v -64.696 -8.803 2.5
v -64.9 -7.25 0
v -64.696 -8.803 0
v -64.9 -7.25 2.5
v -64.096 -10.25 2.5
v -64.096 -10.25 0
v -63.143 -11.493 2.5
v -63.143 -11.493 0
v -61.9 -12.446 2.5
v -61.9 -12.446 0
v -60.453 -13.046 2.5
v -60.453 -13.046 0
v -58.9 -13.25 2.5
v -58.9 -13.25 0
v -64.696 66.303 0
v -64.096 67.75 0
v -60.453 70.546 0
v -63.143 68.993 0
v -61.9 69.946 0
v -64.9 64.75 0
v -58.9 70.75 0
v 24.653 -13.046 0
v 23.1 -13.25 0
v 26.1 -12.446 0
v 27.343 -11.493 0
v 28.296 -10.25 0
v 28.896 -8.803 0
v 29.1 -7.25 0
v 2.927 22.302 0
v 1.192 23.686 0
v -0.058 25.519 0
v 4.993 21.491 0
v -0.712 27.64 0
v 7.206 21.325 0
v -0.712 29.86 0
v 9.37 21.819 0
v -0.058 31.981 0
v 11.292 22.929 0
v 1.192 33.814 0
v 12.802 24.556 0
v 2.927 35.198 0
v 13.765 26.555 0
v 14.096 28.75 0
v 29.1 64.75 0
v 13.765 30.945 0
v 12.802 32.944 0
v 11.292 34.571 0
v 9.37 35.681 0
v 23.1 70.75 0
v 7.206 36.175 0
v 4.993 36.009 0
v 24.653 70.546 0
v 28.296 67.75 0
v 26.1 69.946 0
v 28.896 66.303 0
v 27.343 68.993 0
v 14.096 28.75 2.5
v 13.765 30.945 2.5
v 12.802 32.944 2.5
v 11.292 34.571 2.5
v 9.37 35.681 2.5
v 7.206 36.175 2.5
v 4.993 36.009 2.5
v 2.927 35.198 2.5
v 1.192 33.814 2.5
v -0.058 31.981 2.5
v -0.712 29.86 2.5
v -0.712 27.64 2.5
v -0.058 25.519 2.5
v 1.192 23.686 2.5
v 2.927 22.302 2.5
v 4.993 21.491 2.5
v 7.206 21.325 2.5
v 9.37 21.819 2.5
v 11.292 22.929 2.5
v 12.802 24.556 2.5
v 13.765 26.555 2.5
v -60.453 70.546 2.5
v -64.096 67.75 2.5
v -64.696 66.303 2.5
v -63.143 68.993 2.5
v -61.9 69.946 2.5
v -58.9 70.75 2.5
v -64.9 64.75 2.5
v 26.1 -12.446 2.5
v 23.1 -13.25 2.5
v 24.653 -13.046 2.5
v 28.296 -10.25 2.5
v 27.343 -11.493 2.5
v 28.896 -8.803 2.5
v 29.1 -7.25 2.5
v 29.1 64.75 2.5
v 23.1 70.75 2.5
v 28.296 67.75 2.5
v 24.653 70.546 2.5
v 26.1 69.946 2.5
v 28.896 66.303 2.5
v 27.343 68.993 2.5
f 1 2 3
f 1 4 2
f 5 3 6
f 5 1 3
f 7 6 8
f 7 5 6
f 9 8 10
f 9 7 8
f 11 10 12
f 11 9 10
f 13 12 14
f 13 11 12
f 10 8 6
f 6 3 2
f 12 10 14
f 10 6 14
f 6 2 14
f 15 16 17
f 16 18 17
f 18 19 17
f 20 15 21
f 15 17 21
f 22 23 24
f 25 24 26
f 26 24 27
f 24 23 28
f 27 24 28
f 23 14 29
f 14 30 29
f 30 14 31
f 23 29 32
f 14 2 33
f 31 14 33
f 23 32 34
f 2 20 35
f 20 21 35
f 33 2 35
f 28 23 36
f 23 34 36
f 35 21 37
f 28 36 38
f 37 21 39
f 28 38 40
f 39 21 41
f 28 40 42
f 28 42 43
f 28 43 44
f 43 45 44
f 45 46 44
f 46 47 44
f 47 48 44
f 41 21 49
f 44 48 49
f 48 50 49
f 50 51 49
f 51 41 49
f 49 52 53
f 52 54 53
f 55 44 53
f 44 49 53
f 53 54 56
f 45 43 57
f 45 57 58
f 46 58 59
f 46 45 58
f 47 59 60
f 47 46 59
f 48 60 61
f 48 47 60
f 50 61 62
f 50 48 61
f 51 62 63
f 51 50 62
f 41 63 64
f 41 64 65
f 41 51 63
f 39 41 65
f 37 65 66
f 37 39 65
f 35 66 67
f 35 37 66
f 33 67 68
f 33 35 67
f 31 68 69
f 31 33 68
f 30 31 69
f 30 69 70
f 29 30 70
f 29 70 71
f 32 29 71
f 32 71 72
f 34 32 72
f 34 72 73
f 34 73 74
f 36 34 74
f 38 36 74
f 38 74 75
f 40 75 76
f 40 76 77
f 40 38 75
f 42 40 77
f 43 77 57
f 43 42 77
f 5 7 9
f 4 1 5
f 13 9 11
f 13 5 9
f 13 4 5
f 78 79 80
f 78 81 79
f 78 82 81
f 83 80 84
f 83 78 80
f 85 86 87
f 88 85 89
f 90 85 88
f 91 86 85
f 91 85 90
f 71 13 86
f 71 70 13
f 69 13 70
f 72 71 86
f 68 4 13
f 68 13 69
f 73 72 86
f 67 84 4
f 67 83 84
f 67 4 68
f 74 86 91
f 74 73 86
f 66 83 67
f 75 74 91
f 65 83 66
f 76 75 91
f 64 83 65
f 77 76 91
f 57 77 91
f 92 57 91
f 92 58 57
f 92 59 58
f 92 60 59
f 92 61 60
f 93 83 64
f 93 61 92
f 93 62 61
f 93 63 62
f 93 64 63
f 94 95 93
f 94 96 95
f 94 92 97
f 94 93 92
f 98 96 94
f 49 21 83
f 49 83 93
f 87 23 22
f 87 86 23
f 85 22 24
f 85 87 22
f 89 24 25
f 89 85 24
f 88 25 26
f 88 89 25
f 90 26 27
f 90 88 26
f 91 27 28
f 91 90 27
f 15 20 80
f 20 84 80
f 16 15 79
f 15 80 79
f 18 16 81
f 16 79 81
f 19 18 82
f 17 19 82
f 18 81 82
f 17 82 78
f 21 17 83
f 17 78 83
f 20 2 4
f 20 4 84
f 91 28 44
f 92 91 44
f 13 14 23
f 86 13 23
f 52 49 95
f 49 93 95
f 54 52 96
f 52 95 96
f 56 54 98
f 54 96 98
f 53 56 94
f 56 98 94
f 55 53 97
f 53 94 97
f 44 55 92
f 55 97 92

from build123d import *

# Parameters (mm, degrees)
CROQUIS1_W              = 94
CROQUIS1_H              = 84
CROQUIS1_R              = 7.445624545
SALIENTE_EXTRUIR1_DEPTH = 2.5
REDONDEO1_R             = 6


with BuildPart() as part:
    # Croquis1 → Saliente-Extruir1 (new body)
    with BuildSketch(Plane.XY):
        with Locations((-17.9, 28.75)):
            Rectangle(CROQUIS1_W, CROQUIS1_H)
        with Locations((6.65, 28.75)):
            Circle(CROQUIS1_R, mode=Mode.SUBTRACT)
    extrude(amount=SALIENTE_EXTRUIR1_DEPTH)

    # Redondeo1
    redondeo1_edges = [part.edges().sort_by_distance(p)[0] for p in [
        (-64.9, 70.75, 1.25),
        (29.1, 70.75, 1.25),
        (29.1, -13.25, 1.25),
        (-64.9, -13.25, 1.25),
    ]]
    fillet(redondeo1_edges, radius=REDONDEO1_R)


solid = part.part
